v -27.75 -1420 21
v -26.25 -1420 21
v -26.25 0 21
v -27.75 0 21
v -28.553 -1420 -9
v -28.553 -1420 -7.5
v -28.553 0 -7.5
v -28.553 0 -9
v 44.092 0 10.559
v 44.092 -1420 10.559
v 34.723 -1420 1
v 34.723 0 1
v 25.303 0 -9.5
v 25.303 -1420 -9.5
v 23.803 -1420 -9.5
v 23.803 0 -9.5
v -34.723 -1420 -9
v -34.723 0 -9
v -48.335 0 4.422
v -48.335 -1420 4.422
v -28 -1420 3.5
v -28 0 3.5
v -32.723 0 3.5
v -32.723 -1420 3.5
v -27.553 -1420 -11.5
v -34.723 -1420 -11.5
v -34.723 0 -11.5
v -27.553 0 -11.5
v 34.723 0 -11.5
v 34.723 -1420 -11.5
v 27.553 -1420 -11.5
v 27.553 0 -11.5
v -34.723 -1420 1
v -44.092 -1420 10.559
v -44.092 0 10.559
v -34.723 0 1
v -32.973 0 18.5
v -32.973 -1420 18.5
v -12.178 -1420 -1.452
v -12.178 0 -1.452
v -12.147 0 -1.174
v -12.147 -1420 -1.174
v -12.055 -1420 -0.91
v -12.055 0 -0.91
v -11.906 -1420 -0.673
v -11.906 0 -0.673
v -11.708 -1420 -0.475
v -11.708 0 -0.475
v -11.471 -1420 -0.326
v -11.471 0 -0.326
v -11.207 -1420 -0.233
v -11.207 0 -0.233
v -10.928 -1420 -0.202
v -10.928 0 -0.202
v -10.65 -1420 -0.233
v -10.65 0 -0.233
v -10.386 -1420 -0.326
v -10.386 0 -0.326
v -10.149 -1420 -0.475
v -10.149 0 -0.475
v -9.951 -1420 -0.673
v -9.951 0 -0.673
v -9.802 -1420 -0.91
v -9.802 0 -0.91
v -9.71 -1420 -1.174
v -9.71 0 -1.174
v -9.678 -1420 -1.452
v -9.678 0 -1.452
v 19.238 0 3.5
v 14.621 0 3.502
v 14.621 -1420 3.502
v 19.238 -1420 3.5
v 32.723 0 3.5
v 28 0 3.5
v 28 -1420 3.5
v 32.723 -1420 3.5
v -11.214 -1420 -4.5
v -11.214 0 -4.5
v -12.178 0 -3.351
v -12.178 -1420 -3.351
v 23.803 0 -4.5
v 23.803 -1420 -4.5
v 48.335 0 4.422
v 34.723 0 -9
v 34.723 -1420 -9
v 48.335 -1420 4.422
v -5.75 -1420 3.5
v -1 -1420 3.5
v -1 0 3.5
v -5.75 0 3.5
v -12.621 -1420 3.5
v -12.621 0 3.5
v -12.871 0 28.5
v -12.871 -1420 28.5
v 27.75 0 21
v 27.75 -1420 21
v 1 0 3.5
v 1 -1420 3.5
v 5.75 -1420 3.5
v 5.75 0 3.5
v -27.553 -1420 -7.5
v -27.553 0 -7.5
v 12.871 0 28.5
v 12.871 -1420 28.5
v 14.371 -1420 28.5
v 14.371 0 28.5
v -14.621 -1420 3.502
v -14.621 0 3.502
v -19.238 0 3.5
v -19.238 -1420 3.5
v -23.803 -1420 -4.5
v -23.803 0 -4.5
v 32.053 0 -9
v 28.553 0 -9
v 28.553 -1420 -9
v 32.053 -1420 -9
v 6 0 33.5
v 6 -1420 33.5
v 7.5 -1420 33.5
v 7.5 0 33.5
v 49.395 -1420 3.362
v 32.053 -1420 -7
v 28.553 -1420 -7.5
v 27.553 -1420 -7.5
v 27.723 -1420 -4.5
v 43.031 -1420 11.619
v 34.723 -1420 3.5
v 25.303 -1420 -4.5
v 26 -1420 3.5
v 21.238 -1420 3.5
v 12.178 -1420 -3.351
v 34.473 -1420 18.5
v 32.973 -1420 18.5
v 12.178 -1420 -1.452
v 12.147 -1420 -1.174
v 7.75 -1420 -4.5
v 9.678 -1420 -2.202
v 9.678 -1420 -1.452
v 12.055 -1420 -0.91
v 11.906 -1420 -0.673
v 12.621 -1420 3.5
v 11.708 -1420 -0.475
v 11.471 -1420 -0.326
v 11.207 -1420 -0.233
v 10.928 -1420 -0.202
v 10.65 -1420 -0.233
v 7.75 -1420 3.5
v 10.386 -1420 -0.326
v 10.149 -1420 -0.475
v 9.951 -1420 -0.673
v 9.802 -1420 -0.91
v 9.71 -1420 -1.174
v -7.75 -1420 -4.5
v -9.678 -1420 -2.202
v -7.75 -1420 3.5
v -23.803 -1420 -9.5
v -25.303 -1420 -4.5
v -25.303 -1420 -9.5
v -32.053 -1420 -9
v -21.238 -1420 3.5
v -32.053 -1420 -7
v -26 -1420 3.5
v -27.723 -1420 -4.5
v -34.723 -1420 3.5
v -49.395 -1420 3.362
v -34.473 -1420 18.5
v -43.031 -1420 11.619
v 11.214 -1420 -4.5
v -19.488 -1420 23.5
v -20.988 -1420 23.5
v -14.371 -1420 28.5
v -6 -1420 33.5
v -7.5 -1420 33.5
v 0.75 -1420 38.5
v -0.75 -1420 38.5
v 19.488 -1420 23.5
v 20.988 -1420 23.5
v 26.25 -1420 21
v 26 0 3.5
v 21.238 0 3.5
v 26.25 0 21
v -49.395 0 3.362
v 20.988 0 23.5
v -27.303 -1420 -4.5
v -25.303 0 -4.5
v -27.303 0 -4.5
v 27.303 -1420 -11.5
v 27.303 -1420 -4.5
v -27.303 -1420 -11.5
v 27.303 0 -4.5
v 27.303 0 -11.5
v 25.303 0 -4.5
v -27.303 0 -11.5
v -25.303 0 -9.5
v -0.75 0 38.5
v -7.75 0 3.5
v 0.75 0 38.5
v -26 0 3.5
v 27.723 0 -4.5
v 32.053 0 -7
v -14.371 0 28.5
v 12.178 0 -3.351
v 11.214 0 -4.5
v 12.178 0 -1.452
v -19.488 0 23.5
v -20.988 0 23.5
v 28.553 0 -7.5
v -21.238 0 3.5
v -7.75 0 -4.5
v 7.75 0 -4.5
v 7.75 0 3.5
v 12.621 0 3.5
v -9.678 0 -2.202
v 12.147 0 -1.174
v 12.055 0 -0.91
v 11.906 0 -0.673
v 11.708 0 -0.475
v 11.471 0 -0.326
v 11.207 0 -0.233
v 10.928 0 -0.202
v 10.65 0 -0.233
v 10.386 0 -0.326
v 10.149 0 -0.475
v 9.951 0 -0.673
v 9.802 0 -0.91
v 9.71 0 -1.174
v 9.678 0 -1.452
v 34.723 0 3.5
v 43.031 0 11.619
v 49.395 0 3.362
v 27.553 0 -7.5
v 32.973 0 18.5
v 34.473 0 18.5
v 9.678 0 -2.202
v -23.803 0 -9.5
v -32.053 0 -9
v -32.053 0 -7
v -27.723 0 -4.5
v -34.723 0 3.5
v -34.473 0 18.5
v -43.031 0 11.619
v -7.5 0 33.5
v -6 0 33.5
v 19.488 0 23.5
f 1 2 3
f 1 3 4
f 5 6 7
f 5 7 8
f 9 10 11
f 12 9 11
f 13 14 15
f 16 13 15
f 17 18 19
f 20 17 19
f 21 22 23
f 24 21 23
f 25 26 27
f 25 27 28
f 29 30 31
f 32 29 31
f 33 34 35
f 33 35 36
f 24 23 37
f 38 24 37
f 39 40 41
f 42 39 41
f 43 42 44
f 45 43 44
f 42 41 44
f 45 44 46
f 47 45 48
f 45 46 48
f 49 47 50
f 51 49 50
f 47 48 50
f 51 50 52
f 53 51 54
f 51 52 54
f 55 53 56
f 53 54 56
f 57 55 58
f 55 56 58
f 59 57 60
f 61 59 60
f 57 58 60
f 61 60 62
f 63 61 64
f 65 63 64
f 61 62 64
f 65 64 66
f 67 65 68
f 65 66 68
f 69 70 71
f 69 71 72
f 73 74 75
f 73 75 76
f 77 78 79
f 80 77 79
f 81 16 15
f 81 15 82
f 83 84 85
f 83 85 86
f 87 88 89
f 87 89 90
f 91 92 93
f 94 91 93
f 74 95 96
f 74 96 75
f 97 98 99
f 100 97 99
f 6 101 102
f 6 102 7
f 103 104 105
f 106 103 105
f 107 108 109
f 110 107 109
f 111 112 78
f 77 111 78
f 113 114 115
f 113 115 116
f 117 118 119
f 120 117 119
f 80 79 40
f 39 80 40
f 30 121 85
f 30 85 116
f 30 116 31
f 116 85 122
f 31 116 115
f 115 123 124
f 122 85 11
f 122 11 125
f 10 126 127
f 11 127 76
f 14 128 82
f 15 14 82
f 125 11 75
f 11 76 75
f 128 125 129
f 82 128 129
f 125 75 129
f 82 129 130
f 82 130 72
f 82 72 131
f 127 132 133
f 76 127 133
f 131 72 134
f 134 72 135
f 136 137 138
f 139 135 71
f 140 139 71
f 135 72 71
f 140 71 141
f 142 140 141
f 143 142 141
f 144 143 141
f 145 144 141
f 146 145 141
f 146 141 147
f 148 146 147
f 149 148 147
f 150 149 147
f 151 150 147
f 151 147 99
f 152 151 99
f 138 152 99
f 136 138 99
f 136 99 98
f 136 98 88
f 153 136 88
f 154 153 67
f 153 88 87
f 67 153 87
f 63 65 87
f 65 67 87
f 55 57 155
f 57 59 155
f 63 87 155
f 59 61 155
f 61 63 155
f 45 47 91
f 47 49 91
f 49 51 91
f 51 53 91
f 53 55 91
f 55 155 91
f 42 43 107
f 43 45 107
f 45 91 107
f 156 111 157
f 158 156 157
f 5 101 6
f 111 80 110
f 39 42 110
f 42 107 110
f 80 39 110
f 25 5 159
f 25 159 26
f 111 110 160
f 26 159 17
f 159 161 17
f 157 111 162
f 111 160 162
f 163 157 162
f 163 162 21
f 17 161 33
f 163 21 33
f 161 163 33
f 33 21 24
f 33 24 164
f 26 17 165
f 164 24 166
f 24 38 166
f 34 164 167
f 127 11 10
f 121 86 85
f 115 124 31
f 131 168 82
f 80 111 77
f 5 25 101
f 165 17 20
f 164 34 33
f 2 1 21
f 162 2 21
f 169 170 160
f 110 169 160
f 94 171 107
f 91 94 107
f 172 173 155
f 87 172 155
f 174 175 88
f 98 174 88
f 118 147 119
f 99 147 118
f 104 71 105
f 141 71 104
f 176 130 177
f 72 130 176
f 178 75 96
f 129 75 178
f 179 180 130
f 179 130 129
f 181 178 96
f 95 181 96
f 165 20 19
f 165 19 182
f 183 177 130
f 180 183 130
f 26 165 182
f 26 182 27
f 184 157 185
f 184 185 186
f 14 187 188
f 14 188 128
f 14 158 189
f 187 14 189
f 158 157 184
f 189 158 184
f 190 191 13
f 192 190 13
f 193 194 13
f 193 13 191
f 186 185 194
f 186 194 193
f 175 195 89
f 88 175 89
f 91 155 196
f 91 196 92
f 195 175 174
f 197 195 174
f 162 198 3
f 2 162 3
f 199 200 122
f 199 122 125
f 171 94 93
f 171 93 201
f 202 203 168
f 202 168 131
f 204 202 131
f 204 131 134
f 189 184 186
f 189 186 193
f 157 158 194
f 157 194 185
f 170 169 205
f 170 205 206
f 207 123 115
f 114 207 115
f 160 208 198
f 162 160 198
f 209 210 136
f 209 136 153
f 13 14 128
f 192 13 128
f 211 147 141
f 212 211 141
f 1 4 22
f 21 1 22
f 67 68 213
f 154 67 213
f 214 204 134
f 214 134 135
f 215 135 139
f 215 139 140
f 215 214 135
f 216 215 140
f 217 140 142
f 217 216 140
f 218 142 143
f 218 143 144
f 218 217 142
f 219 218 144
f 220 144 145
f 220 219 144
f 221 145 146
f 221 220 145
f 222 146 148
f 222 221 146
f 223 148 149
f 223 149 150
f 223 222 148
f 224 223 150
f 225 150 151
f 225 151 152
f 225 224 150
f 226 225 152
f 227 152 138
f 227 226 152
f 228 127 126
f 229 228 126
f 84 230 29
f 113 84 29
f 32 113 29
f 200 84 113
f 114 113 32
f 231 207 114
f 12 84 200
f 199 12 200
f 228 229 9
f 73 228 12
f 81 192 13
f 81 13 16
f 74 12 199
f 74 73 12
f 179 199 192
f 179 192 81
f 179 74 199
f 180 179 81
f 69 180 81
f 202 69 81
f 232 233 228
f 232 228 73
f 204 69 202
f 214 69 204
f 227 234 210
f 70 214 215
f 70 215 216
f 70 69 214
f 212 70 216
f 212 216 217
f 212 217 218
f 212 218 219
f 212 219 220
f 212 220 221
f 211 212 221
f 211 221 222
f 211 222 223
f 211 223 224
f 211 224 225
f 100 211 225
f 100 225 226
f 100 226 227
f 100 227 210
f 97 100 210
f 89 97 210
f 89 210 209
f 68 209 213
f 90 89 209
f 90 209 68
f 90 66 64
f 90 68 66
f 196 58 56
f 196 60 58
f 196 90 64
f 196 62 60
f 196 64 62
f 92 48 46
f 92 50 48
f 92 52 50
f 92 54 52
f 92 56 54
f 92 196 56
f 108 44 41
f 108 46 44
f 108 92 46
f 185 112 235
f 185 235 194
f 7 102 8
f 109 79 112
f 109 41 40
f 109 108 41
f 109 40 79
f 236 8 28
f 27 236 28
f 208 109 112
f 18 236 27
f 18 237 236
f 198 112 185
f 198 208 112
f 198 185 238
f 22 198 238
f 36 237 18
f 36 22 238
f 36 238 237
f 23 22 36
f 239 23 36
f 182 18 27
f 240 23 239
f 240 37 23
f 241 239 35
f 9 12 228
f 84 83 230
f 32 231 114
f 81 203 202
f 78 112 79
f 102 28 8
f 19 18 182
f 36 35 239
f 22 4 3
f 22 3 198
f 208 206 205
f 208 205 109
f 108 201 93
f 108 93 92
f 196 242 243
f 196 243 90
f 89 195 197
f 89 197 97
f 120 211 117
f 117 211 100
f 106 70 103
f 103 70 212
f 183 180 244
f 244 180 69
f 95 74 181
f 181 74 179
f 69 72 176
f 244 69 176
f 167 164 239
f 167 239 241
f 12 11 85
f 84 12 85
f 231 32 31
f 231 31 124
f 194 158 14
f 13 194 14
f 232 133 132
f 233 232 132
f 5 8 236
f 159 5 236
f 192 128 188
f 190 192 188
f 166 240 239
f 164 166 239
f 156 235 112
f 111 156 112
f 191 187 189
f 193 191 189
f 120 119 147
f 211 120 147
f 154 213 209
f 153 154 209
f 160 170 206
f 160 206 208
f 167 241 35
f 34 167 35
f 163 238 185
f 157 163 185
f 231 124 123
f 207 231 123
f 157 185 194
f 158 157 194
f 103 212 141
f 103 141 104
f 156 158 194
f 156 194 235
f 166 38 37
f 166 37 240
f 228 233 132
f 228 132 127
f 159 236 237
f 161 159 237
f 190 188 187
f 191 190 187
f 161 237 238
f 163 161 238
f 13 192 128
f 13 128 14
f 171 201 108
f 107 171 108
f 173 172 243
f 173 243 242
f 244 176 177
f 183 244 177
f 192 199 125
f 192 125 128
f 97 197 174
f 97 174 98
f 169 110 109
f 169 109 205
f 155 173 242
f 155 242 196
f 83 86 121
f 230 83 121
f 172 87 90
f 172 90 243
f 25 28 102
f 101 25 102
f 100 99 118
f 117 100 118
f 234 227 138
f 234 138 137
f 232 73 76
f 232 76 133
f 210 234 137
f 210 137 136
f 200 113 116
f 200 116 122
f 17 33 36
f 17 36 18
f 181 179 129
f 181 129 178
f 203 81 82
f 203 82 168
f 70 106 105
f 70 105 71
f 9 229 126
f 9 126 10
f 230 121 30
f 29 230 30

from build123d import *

# Parameters (mm, degrees)
F1_DEPTH = 1420
F3_DEPTH = 1420
F5_DEPTH = 1420


with BuildPart() as f1:
    # F0 (on Front) → F1 (new body)
    with BuildSketch(Plane.XZ):
        with BuildLine():
            Line((-32.7227568555, 3.4999999998), (-32.9727568555, 18.4999999998))
            Line((-32.9727568555, 18.4999999998), (-34.4727568555, 18.4999999998))
            Line((-34.4727568555, 18.4999999998), (-34.7227568555, 3.4999999998))
            Line((-34.7227568555, 3.4999999998), (-34.7227568555, -11.5000000002))
            Line((-34.7227568555, -11.5000000002), (-27.5528838745, -11.5000000002))
            Line((-27.5528838745, -11.5000000002), (-27.5528838745, -7.5000000002))
            Line((-27.5528838745, -7.5000000002), (-28.5528838745, -7.5000000002))
            Line((-28.5528838745, -7.5000000002), (-28.5528838745, -9.0000000002))
            Line((-28.5528838745, -9.0000000002), (-32.0528838745, -9.0000000002))
            Line((-32.0528838745, -9.0000000002), (-32.0528838745, -7.0000000002))
            Line((-32.0528838745, -7.0000000002), (-27.7227568555, -4.5000000002))
            Line((-27.7227568555, -4.5000000002), (-27.1091535687, -4.5000000002))
            Line((-27.1091535687, -4.5000000002), (-25.3028838745, -4.5000000002))
            Line((-25.3028838745, -4.5000000002), (-25.3028838745, -9.5000000002))
            Line((-25.3028838745, -9.5000000002), (-23.8028838745, -9.5000000002))
            Line((-23.8028838745, -9.5000000002), (-23.8028838745, -4.5000000002))
            Line((-23.8028838745, -4.5000000002), (-11.2141814145, -4.5000000002))
            Line((-11.2141814145, -4.5000000002), (-12.1783628291, -3.3509333355))
            Line((-12.1783628291, -3.3509333355), (-12.1783628291, -1.4518666708))
            ThreePointArc((-12.1783628291, -1.4518666708), (-10.9283628291, -0.2018666708), (-9.6783628291, -1.4518666708))
            Line((-9.6783628291, -1.4518666708), (-9.6783628291, -2.2018666708))
            Line((-9.6783628291, -2.2018666708), (-7.75, -4.5000000002))
            Line((-7.75, -4.5000000002), (0, -4.5000000002))
            Line((0, -4.5000000002), (0, 38.4999999998))
            Line((0, 38.4999999998), (-0.75, 38.4999999998))
            Line((-0.75, 38.4999999998), (-1, 3.4999999998))
            Line((-1, 3.4999999998), (-5.75, 3.4999999998))
            Line((-5.75, 3.4999999998), (-6, 33.4999999998))
            Line((-6, 33.4999999998), (-7.5, 33.4999999998))
            Line((-7.5, 33.4999999998), (-7.75, 3.4999999998))
            Line((-7.75, 3.4999999998), (-12.6212390675, 3.4999999998))
            Line((-12.6212390675, 3.4999999998), (-12.8712390675, 28.4999999998))
            Line((-12.8712390675, 28.4999999998), (-14.3712390675, 28.4999999998))
            Line((-14.3712390675, 28.4999999998), (-14.6212390675, 3.5015064141))
            Line((-14.6212390675, 3.5015064141), (-19.2384126596, 3.4999999998))
            Line((-19.2384126596, 3.4999999998), (-19.4884126596, 23.4999999998))
            Line((-19.4884126596, 23.4999999998), (-20.9884126596, 23.4999999998))
            Line((-20.9884126596, 23.4999999998), (-21.2384126596, 3.4999999998))
            Line((-21.2384126596, 3.4999999998), (-26, 3.4999999998))
            Line((-26, 3.4999999998), (-26.25, 20.9999999998))
            Line((-26.25, 20.9999999998), (-27.75, 20.9999999998))
            Line((-27.75, 20.9999999998), (-28, 3.4999999998))
            Line((-28, 3.4999999998), (-32.7227568555, 3.4999999998))
        make_face()
    extrude(amount=F1_DEPTH)

    # F2 (on face) → F3 (join)
    with BuildSketch(Plane.XZ.offset(1420)):
        Polygon((-44.0919217063, 10.5585046788), (-34.7227568555, 0.9999999998), (-34.7227568555, 3.4999999998), (-43.0312615345, 11.6191648506), align=None)
        Polygon((-49.3952225652, 3.3618055377), (-34.7227568555, -11.5000000002), (-34.7227568555, -9.0000000002), (-48.3345623934, 4.4224657095), align=None)
    extrude(amount=-F3_DEPTH)

    # F6: F1 across face


with BuildPart() as f5:
    # F4 (on face) → F5 (new body)
    with BuildSketch(Plane.XZ.offset(1420)):
        Polygon((-25.3028838745, -9.5000000002), (-25.3028838745, -4.5000000002), (-27.3028838745, -4.5000000002), (-27.3028838745, -11.5000000002), (0, -11.5000000002), (0, -9.5000000002), align=None)
    extrude(amount=-F5_DEPTH)

    # F7: F5 across face


with BuildPart() as f1_1:
    add(f1.part)
    add(f1.part.mirror(Plane(origin=(0, -710, 16.9999999998), x_dir=(0, 1, 0), z_dir=(1, 0, 0))))


with BuildPart() as f5_1:
    add(f5.part)
    add(f5.part.mirror(Plane(origin=(0, -710, -10.5000000002), x_dir=(0, 1, 0), z_dir=(1, 0, 0))))


solid = Compound([f1_1.part, f5_1.part])
